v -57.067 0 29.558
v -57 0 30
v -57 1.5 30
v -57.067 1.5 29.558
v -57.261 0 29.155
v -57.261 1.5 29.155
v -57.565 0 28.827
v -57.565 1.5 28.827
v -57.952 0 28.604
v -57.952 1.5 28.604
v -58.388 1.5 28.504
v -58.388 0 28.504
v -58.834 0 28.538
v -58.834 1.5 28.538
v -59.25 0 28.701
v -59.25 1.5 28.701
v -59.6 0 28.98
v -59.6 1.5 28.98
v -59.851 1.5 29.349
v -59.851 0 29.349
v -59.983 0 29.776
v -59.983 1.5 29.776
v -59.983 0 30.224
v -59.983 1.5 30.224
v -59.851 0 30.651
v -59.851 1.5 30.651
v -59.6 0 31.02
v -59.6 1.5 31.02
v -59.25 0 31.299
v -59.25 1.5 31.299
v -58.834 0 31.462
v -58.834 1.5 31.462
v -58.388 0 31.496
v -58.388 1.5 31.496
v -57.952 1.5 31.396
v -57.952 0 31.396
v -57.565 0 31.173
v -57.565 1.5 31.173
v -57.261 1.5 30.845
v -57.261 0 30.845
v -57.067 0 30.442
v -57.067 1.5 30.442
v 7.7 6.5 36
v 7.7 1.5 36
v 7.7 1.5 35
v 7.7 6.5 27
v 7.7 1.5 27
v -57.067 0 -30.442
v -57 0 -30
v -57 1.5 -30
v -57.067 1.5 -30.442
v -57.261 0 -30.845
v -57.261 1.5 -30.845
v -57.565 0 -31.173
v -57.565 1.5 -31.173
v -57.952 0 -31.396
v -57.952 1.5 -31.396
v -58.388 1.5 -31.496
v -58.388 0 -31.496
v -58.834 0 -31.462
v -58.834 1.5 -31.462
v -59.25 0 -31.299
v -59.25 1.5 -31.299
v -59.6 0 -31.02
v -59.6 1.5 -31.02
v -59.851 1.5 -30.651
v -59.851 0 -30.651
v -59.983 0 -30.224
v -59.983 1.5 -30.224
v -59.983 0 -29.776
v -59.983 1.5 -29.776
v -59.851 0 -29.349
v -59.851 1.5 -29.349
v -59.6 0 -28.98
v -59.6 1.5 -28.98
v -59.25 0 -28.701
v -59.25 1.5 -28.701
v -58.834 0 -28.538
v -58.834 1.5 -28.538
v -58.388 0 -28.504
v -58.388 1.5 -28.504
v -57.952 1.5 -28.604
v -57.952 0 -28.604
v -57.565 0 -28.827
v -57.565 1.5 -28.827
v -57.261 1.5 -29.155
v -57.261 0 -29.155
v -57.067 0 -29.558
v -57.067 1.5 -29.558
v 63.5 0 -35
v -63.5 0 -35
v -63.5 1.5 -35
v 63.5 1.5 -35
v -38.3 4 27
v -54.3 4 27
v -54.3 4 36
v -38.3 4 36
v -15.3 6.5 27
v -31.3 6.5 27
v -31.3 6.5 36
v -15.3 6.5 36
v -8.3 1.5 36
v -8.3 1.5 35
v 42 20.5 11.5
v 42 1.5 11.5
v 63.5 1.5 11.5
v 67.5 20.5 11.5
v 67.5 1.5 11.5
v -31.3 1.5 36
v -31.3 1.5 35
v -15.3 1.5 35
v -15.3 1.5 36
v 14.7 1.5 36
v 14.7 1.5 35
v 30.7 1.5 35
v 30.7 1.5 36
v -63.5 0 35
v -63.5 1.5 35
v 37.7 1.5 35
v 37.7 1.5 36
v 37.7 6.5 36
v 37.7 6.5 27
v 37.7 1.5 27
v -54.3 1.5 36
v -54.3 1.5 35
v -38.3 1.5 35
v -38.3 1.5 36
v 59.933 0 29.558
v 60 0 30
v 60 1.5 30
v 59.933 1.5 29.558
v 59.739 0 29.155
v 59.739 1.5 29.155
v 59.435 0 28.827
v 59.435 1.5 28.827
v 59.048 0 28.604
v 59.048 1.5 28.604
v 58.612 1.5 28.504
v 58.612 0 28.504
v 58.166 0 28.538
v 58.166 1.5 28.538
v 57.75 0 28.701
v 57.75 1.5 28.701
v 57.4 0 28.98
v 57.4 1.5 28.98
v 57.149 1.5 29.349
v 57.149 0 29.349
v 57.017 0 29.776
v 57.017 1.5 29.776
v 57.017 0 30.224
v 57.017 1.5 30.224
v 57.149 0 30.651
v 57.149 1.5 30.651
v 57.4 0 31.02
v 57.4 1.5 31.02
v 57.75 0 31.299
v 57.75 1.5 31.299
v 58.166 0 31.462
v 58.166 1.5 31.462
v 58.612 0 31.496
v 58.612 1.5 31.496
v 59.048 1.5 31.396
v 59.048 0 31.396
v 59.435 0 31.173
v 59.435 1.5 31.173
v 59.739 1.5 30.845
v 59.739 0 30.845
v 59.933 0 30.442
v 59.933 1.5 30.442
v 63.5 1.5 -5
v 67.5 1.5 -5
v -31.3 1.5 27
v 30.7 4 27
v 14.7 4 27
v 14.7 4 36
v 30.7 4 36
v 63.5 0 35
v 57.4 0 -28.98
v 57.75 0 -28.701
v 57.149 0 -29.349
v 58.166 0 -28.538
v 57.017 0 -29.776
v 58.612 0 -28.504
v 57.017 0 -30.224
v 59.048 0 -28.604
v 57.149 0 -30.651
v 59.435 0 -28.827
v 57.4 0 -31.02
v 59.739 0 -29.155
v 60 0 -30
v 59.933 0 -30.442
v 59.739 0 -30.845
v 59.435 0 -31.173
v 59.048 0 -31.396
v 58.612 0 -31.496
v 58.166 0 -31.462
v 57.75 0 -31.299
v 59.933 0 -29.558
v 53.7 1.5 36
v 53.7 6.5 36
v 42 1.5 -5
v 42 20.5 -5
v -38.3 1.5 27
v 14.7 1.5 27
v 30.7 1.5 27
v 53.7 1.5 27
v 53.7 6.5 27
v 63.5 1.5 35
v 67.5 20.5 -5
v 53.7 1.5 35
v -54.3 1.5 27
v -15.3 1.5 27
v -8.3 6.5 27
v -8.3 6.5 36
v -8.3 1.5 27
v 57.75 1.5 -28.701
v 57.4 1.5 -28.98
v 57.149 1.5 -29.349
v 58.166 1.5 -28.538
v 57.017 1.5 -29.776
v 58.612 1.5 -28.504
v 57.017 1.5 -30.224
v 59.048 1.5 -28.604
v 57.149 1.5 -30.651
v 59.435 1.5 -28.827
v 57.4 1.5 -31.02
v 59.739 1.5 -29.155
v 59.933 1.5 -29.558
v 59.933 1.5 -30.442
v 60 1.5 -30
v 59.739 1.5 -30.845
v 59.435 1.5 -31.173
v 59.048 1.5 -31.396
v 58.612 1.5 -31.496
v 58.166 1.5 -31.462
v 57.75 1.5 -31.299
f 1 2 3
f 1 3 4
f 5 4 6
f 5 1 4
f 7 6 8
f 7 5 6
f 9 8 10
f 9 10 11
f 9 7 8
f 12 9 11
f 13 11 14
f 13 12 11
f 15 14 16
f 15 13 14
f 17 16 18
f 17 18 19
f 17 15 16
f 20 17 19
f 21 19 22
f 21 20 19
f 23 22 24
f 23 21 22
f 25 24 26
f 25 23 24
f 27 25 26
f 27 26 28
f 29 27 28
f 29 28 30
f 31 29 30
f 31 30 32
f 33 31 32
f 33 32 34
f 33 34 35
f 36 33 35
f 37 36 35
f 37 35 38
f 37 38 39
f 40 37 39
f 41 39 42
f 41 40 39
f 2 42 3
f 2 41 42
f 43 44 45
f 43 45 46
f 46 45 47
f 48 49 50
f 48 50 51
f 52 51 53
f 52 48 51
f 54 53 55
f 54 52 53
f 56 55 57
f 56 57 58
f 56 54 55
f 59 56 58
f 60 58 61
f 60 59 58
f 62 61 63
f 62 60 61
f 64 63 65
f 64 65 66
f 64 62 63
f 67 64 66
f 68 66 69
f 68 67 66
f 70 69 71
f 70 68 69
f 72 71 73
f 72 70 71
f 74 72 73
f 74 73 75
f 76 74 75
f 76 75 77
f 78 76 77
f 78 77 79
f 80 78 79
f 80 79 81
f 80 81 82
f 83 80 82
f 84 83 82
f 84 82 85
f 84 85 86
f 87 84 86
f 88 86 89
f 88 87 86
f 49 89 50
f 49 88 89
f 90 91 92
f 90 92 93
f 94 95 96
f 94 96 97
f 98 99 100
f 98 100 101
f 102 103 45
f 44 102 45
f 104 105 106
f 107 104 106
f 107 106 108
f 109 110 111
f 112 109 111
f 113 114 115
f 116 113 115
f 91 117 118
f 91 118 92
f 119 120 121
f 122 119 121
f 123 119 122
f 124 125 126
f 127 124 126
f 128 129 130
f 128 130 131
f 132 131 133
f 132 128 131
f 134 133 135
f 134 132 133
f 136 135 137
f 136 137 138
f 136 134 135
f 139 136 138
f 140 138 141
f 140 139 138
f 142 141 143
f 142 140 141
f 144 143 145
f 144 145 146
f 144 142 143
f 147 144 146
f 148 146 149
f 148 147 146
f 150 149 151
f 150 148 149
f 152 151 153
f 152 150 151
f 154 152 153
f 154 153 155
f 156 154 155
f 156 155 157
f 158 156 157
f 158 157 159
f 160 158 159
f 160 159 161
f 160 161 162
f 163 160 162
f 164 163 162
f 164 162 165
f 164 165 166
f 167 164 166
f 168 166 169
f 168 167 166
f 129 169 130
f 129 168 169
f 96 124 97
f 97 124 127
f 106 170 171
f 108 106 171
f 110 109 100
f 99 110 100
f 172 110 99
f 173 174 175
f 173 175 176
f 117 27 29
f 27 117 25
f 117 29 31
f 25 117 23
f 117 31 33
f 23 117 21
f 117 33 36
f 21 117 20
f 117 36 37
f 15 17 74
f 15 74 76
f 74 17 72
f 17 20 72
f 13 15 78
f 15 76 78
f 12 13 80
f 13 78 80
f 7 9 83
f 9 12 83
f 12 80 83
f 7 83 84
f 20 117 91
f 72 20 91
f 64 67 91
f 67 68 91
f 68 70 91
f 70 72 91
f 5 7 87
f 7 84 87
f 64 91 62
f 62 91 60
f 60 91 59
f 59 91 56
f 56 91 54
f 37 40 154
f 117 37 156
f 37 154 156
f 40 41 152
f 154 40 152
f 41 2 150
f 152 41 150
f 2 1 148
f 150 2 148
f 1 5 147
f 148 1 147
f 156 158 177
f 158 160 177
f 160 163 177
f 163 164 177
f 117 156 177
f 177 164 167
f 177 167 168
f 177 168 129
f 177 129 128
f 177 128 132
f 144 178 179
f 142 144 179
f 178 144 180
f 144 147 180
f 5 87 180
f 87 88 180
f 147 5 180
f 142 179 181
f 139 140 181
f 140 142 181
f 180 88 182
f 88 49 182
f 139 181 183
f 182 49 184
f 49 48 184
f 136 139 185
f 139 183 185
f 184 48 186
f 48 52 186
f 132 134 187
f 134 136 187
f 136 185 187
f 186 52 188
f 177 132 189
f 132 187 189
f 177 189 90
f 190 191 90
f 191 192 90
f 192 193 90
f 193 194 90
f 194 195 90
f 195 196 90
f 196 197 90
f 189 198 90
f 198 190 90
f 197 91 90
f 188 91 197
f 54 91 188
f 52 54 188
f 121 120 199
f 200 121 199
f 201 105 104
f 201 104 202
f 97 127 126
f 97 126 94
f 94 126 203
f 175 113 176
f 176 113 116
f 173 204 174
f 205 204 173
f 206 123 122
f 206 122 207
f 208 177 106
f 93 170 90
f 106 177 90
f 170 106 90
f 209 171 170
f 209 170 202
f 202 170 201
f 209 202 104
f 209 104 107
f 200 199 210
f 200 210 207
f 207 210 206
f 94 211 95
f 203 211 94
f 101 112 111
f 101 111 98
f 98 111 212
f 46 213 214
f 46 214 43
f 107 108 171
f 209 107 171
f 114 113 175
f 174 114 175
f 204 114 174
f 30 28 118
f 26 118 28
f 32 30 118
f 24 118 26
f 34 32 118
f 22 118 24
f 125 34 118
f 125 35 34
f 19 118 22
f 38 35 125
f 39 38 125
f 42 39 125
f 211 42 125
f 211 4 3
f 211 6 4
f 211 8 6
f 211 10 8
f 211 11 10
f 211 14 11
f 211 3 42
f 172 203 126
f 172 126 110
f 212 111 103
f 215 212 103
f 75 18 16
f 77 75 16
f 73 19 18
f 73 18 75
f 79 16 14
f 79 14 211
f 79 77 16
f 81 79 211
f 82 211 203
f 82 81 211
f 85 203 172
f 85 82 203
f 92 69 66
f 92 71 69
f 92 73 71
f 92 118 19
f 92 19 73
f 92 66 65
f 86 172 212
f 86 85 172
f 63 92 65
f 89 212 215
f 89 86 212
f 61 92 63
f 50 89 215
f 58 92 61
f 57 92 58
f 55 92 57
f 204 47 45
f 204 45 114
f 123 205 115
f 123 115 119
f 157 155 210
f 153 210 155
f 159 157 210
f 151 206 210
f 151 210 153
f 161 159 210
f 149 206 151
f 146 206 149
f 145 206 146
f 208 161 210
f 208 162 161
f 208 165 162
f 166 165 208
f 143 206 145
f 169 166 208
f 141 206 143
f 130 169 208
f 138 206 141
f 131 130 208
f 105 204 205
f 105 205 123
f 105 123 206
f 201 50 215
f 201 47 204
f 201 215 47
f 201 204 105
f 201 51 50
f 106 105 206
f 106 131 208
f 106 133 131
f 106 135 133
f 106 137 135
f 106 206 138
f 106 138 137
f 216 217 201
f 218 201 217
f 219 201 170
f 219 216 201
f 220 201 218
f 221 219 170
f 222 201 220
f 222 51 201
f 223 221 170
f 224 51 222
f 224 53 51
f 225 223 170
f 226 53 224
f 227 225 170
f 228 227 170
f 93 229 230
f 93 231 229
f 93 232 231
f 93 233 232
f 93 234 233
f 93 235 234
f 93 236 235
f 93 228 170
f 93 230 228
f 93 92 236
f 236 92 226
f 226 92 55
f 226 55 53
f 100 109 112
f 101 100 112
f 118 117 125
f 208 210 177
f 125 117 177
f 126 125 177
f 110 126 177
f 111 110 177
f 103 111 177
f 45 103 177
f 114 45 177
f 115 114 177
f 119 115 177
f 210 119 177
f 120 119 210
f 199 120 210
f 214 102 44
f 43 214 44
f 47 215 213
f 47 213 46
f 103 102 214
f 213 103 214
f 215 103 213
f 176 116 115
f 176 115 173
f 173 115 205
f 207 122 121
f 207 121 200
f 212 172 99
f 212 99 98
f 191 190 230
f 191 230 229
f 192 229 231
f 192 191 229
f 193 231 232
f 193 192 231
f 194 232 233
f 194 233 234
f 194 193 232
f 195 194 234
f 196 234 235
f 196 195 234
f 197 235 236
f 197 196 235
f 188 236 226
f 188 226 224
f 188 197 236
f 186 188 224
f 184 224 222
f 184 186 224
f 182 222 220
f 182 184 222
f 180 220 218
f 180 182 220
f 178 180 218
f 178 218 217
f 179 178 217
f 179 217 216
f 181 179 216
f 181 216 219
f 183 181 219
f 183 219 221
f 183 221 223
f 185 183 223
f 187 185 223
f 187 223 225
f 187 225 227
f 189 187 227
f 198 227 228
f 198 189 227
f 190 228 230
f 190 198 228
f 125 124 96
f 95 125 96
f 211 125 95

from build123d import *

# Parameters (mm, degrees)
ESQUISSE1_W        = 127
ESQUISSE1_H        = 70
ESQUISSE1_R        = 1.5
BOSS_EXTRU_1_DEPTH = 1.5
ESQUISSE2_W        = 16
ESQUISSE2_H        = 9
BOSS_EXTRU_2_DEPTH = 2.5
ESQUISSE2_3_W      = 16
ESQUISSE2_3_H      = 9
BOSS_EXTRU_3_DEPTH = 5
ESQUISSE2_4_W      = 25.5
ESQUISSE2_4_H      = 16.5
BOSS_EXTRU_4_DEPTH = 19


with BuildPart() as part:
    # Esquisse1 → Boss.-Extru.1 (new body)
    with BuildSketch(Plane(origin=(0, 0, 0), x_dir=(1, 0, 0), z_dir=(0, 1, 0))):
        Rectangle(ESQUISSE1_W, ESQUISSE1_H)
        with Locations((-58.5, 30)):
            Circle(ESQUISSE1_R, mode=Mode.SUBTRACT)
        with Locations((-58.5, -30)):
            Circle(ESQUISSE1_R, mode=Mode.SUBTRACT)
        with Locations((58.5, 30)):
            Circle(ESQUISSE1_R, mode=Mode.SUBTRACT)
        with Locations((58.5, -30)):
            Circle(ESQUISSE1_R, mode=Mode.SUBTRACT)
    extrude(amount=BOSS_EXTRU_1_DEPTH)

    # Esquisse2 → Boss.-Extru.2 (add)
    with BuildSketch(Plane(origin=(0, 1.5, 0), x_dir=(1, 0, 0), z_dir=(0, 1, 0))):
        with Locations((22.7, -31.5)):
            Rectangle(ESQUISSE2_W, ESQUISSE2_H)
        with Locations((-46.3, -31.5)):
            Rectangle(ESQUISSE2_W, ESQUISSE2_H)
    extrude(amount=BOSS_EXTRU_2_DEPTH)

    # Esquisse2<3> → Boss.-Extru.3 (add)
    with BuildSketch(Plane(origin=(0, 1.5, 0), x_dir=(1, 0, 0), z_dir=(0, 1, 0))):
        with Locations((-23.3, -31.5)):
            Rectangle(ESQUISSE2_3_W, ESQUISSE2_3_H)
        with Locations((45.7, -31.5)):
            Rectangle(ESQUISSE2_3_W, ESQUISSE2_3_H)
        with Locations((-0.3, -31.5)):
            Rectangle(ESQUISSE2_3_W, ESQUISSE2_3_H)
    extrude(amount=BOSS_EXTRU_3_DEPTH)

    # Esquisse2<4> → Boss.-Extru.4 (add)
    with BuildSketch(Plane(origin=(0, 1.5, 0), x_dir=(1, 0, 0), z_dir=(0, 1, 0))):
        with Locations((54.75, -3.25)):
            Rectangle(ESQUISSE2_4_W, ESQUISSE2_4_H)
    extrude(amount=BOSS_EXTRU_4_DEPTH)


solid = part.part
